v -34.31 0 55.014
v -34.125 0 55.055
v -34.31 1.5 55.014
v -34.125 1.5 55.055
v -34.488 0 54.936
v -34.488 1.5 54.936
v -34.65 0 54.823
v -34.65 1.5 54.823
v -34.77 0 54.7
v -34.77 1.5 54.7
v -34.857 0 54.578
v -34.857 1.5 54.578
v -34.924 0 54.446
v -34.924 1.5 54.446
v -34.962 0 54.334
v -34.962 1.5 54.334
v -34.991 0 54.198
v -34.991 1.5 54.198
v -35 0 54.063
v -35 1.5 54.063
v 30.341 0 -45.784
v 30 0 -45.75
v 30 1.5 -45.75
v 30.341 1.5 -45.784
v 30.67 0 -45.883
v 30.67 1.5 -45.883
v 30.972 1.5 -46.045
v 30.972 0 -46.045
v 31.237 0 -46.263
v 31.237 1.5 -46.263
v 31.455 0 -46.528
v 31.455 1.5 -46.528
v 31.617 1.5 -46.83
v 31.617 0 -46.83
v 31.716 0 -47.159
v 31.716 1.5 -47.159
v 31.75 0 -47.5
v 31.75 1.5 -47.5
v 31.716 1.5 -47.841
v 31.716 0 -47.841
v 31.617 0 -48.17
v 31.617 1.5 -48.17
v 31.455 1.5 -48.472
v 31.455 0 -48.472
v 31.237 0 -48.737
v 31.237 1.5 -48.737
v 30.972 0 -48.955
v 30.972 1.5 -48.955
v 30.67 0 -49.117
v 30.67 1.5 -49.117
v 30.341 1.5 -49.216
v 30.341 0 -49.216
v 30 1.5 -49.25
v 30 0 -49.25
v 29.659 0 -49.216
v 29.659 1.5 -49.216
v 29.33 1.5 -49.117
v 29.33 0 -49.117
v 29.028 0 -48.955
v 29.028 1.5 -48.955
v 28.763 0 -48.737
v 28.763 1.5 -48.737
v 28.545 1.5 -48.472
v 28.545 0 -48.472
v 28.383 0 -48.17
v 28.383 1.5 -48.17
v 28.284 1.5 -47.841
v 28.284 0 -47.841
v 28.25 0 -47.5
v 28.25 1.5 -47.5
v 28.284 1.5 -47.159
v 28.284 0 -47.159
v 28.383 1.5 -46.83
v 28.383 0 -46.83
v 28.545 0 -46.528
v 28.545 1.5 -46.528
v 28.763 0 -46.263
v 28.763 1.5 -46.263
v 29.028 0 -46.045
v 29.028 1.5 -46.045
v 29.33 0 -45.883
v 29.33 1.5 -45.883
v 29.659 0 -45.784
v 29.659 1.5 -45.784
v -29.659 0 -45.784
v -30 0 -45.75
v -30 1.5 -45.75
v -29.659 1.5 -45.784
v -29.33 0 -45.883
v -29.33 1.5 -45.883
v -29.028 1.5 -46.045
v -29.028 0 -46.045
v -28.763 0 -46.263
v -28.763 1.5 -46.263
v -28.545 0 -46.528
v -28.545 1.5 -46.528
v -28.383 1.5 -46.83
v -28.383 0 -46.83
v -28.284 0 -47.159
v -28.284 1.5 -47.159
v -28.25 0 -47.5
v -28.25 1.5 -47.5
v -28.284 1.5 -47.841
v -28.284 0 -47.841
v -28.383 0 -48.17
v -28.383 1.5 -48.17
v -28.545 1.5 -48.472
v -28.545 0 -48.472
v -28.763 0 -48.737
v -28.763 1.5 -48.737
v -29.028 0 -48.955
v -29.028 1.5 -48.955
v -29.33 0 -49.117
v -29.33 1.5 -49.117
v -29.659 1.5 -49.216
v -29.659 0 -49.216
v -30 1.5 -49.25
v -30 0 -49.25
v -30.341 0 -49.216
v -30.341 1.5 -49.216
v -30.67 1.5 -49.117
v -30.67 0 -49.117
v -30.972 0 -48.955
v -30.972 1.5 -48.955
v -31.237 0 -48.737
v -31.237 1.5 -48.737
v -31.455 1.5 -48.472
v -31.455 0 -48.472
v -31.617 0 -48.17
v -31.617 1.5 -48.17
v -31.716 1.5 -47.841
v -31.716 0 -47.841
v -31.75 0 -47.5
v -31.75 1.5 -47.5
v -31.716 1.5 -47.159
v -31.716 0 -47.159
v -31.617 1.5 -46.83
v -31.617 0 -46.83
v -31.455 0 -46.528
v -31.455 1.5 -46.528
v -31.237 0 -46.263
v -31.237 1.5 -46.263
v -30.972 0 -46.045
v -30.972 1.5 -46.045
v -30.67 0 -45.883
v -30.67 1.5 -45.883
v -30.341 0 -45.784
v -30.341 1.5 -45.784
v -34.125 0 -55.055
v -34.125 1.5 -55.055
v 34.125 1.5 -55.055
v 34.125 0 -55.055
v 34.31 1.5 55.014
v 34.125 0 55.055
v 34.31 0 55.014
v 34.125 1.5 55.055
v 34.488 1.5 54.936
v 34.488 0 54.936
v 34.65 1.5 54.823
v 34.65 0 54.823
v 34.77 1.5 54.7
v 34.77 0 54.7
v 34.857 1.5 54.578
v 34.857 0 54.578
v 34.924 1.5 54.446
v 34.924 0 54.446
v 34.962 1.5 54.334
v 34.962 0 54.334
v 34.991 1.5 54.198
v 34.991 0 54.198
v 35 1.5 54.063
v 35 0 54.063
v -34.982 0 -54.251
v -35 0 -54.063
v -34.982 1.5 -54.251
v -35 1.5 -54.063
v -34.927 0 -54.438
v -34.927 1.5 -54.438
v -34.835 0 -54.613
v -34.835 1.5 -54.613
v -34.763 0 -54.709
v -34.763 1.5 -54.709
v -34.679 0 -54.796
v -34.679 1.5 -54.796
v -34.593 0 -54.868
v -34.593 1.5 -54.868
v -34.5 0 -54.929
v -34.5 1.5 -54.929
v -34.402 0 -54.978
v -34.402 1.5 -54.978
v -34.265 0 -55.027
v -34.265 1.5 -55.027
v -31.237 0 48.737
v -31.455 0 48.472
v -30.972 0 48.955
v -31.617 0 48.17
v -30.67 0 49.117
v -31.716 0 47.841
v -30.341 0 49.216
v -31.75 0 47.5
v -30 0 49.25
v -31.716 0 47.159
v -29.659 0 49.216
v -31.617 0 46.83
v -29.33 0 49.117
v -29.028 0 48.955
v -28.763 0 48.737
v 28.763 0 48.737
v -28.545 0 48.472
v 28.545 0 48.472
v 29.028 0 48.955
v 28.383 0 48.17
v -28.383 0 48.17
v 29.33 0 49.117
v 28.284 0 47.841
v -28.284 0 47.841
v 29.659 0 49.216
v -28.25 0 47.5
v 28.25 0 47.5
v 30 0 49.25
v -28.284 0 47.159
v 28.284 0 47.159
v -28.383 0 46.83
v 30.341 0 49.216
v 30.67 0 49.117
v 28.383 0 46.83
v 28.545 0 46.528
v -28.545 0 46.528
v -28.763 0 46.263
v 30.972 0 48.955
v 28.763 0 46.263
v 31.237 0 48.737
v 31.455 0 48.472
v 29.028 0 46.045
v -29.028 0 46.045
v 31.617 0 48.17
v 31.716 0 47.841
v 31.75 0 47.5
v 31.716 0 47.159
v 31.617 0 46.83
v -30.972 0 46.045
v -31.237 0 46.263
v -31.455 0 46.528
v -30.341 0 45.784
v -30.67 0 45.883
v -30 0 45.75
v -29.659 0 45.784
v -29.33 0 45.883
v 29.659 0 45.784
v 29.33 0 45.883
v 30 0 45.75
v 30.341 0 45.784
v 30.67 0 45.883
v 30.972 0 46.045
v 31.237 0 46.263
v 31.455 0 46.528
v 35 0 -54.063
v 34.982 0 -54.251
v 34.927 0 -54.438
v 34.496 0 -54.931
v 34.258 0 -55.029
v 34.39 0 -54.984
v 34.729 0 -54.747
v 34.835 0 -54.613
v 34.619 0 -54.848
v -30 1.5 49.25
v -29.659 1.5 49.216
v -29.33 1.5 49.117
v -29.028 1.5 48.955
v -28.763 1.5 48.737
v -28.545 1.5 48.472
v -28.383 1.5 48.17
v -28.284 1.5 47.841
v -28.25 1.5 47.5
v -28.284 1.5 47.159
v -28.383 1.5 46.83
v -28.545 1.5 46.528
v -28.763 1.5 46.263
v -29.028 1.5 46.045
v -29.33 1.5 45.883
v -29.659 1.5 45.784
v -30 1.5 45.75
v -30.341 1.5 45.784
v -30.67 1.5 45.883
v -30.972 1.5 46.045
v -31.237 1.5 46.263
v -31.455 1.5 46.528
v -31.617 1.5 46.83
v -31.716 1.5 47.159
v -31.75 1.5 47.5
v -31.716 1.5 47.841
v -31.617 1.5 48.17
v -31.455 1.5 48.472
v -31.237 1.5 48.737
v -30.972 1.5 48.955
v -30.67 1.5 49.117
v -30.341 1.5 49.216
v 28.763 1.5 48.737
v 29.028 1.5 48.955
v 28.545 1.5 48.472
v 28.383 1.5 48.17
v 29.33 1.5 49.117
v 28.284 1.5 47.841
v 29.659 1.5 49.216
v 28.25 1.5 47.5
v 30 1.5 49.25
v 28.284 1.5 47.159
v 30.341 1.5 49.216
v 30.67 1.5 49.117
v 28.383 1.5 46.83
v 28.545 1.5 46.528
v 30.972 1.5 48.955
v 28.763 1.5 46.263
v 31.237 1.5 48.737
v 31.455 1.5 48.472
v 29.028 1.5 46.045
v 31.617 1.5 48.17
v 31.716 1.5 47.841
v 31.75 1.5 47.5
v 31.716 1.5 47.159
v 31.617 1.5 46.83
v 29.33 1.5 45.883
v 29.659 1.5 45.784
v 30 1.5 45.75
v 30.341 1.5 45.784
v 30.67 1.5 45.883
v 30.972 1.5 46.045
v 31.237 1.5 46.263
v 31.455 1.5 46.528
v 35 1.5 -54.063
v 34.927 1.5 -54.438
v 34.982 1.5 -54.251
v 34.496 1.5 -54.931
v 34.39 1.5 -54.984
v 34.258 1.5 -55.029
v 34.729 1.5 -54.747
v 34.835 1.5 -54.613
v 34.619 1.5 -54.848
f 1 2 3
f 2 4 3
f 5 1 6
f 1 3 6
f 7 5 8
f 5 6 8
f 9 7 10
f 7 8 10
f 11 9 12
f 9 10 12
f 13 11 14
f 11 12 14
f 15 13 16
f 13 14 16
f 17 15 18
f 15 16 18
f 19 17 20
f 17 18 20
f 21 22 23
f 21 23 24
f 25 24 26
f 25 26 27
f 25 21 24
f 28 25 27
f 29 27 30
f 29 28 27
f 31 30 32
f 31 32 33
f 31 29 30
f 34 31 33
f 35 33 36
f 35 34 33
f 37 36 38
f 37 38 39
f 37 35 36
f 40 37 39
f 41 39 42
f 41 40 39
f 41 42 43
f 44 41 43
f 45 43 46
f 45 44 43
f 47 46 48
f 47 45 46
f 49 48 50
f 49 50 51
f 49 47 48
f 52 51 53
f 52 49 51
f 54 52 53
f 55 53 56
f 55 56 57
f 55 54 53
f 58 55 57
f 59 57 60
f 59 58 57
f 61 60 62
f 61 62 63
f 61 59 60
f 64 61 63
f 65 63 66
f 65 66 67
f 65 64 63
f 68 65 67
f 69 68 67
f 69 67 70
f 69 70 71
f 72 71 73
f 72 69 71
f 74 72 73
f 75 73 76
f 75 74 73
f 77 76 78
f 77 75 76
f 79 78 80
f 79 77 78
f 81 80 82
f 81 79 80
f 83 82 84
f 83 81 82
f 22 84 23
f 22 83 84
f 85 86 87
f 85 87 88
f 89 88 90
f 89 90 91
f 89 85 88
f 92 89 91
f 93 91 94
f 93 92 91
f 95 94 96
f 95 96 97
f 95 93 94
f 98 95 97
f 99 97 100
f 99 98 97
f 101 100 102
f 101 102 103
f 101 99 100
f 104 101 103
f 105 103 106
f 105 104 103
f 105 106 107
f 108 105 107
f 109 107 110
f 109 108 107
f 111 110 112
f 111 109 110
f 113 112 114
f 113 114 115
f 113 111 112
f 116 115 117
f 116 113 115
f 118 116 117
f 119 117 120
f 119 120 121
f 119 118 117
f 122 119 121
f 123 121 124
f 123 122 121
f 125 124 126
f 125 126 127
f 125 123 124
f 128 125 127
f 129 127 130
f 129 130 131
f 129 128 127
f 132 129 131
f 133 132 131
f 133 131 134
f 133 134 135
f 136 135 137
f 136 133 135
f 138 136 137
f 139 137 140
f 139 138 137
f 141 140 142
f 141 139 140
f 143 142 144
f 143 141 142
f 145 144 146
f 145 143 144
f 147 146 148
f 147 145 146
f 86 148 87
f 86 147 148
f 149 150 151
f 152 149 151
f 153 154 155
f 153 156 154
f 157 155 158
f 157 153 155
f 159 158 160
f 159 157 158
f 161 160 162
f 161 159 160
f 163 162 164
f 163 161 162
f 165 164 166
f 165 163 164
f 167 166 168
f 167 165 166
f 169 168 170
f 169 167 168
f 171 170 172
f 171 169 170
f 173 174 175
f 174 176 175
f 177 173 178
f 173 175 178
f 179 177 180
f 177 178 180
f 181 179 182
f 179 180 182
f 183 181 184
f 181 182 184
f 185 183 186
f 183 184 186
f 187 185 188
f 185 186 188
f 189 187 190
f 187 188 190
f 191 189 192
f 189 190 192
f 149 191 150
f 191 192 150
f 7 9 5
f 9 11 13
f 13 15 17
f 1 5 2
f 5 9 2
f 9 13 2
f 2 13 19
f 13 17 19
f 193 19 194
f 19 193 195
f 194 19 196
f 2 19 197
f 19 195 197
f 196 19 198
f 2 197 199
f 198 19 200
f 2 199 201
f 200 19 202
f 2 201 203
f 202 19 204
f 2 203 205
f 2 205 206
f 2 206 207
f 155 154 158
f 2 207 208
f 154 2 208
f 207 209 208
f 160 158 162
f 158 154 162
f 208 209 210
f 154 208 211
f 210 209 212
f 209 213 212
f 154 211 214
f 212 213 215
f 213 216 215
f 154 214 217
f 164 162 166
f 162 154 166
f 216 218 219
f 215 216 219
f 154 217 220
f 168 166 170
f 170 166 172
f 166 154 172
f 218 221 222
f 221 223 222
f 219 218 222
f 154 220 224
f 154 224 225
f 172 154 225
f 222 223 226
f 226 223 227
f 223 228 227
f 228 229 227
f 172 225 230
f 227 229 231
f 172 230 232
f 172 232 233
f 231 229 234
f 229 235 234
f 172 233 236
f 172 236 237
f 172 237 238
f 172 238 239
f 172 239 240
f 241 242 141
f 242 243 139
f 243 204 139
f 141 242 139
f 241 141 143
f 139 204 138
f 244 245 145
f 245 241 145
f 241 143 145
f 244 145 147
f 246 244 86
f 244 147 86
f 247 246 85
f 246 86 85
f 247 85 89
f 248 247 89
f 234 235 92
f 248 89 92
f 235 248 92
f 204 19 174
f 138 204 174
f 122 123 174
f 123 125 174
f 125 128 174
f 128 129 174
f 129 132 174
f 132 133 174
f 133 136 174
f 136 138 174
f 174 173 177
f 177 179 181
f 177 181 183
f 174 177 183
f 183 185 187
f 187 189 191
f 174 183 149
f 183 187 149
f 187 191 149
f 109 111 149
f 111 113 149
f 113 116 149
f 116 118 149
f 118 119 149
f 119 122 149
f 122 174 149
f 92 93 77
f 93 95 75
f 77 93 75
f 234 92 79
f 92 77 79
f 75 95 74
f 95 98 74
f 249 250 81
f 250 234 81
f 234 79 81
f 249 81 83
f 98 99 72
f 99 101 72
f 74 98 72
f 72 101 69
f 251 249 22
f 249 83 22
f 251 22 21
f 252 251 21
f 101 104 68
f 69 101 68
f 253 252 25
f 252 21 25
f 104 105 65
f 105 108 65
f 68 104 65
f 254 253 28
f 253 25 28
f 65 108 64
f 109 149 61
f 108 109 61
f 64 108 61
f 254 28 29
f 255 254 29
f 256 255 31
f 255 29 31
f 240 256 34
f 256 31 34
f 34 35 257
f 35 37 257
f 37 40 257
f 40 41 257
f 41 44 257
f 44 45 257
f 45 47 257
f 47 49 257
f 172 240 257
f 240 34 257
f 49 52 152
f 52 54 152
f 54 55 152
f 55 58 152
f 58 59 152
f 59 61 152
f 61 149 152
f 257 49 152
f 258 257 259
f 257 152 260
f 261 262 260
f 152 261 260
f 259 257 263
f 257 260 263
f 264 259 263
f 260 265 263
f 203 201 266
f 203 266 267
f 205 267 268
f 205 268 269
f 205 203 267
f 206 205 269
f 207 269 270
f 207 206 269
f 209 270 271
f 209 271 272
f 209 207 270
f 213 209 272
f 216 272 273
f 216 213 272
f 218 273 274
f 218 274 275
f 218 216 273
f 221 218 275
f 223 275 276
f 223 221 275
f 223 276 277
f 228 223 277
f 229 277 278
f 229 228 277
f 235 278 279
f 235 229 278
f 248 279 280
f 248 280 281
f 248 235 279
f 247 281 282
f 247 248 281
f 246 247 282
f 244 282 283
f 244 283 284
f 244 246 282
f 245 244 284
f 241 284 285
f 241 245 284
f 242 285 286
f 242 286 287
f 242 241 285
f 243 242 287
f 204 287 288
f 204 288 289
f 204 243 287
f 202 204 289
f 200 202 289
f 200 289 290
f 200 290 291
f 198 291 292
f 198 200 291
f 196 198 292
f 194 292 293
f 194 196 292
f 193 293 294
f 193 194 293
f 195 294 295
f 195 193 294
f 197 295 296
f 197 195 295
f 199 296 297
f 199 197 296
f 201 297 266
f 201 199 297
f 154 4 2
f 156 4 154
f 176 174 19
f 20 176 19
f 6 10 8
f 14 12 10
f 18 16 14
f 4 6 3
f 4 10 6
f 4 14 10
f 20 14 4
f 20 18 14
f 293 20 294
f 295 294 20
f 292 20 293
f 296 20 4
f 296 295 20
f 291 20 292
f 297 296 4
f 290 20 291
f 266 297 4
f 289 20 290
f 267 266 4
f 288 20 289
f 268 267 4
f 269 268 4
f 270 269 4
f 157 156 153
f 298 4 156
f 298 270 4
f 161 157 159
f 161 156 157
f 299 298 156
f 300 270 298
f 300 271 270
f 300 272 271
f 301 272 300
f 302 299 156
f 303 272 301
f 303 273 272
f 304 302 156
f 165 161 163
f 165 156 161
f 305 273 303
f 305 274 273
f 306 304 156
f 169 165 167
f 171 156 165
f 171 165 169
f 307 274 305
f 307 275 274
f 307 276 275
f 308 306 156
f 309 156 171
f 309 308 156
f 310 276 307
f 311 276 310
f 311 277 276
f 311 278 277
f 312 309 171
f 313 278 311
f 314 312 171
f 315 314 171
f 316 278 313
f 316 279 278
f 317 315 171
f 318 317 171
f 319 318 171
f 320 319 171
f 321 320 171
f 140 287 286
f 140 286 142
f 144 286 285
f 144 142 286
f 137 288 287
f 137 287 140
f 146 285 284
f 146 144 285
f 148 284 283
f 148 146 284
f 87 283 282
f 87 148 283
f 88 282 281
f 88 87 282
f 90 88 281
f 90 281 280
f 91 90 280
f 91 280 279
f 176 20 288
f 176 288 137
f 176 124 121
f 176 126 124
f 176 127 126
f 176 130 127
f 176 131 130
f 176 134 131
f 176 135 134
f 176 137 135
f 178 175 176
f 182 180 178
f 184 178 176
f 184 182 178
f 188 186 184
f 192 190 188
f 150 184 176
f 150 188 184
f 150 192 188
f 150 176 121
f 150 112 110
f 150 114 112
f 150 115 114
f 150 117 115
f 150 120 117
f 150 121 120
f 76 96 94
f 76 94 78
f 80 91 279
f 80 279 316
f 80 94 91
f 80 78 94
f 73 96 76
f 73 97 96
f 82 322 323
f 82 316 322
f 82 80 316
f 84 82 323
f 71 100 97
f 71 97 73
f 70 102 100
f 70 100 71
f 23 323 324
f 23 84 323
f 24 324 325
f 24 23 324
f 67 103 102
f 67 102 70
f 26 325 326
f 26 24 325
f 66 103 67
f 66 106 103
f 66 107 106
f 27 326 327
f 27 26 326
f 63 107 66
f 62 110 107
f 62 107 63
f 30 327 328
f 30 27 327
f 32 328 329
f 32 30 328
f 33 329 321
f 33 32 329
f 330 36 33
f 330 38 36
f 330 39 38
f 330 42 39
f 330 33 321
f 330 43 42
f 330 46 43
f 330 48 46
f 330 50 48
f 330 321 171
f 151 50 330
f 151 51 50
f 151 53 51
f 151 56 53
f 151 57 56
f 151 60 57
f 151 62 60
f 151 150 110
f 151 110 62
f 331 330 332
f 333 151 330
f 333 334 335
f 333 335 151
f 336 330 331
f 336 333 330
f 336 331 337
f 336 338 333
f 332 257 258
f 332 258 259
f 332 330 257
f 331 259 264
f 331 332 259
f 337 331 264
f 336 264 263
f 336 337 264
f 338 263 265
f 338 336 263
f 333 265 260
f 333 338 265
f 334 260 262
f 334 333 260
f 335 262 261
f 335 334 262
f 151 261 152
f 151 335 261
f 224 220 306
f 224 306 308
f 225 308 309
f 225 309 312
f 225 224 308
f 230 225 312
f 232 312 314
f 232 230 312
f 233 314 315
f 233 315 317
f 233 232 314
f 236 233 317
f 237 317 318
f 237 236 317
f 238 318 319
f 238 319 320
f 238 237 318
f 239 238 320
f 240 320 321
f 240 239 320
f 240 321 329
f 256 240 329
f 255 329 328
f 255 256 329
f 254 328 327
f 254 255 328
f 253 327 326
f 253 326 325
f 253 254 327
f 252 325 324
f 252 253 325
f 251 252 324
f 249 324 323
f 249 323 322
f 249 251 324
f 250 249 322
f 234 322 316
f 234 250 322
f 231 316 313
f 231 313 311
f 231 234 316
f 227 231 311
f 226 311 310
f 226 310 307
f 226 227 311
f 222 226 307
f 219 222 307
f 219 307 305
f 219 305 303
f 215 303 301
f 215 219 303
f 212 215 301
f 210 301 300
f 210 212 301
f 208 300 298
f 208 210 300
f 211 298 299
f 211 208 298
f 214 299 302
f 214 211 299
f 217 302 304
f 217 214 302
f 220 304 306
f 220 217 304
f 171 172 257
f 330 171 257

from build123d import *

# Parameters (mm, degrees)
SKETCH1_R           = 1.75
BOSS_EXTRUDE1_DEPTH = 1.5
FILLET1_R           = 7
FILLET2_R           = 1
FILLET3_R           = 50
SKETCH2_W           = 103.402572328
SKETCH2_H           = 105.78008475
CUT_EXTRUDE1_DEPTH  = 10


with BuildPart() as part:
    # Sketch1 → Boss-Extrude1 (new body)
    with BuildSketch(Plane(origin=(0, 0, 0), x_dir=(1, 0, 0), z_dir=(0, 1, 0))):
        Polygon((-35, -55), (-28, -55), (-28, -132), (0, -144), (28, -132), (28, -55), (35, -55), (35, 55), (28, 55), (28, 132), (0, 144), (-28, 132), (-28, 55), (-35, 55), align=None)
        with Locations(Location((-30, 47.5, 0), (0, 0, 270))):
            Circle(SKETCH1_R, mode=Mode.SUBTRACT)
        with Locations(Location((30, 47.5, 0), (0, 0, 270))):
            Circle(SKETCH1_R, mode=Mode.SUBTRACT)
        with Locations(Location((30, -47.5, 0), (0, 0, 270))):
            Circle(SKETCH1_R, mode=Mode.SUBTRACT)
        with Locations(Location((-30, -47.5, 0), (0, 0, 270))):
            Circle(SKETCH1_R, mode=Mode.SUBTRACT)
    extrude(amount=BOSS_EXTRUDE1_DEPTH)

    # Fillet1
    fillet1_edges = [part.edges().sort_by_distance(p)[0] for p in [
        (-28, 0.75, 55),
        (28, 0.75, 55),
        (28, 0.75, -55),
        (-28, 0.75, -55),
    ]]
    fillet(fillet1_edges, radius=FILLET1_R - 0.0001)  # a hair under: the kernel refuses the full size

    # Fillet2
    fillet2_edges = [part.edges().sort_by_distance(p)[0] for p in [
        (35, 0.75, -55),
        (35, 0.75, 55),
        (-35, 0.75, 55),
        (-35, 0.75, -55),
    ]]
    fillet(fillet2_edges, radius=FILLET2_R)

    # Fillet3
    fillet3_edges = [part.edges().sort_by_distance(p)[0] for p in [
        (0, 0.75, 144),
        (0, 0.75, -144),
    ]]
    fillet(fillet3_edges, radius=FILLET3_R)

    # Sketch2 → Cut-Extrude1 (cut)
    with BuildSketch(Plane(origin=(0, 1.5, 0), x_dir=(1, 0, 0), z_dir=(0, 1, 0))):
        with Locations((-17.576286164, 107.944945183)):
            Rectangle(SKETCH2_W, SKETCH2_H)
    cut_extrude1 = extrude(amount=-CUT_EXTRUDE1_DEPTH, mode=Mode.SUBTRACT)

    # Mirror1: Cut-Extrude1 across plane
    add(cut_extrude1.mirror(Plane.XY), mode=Mode.SUBTRACT)


solid = part.part
